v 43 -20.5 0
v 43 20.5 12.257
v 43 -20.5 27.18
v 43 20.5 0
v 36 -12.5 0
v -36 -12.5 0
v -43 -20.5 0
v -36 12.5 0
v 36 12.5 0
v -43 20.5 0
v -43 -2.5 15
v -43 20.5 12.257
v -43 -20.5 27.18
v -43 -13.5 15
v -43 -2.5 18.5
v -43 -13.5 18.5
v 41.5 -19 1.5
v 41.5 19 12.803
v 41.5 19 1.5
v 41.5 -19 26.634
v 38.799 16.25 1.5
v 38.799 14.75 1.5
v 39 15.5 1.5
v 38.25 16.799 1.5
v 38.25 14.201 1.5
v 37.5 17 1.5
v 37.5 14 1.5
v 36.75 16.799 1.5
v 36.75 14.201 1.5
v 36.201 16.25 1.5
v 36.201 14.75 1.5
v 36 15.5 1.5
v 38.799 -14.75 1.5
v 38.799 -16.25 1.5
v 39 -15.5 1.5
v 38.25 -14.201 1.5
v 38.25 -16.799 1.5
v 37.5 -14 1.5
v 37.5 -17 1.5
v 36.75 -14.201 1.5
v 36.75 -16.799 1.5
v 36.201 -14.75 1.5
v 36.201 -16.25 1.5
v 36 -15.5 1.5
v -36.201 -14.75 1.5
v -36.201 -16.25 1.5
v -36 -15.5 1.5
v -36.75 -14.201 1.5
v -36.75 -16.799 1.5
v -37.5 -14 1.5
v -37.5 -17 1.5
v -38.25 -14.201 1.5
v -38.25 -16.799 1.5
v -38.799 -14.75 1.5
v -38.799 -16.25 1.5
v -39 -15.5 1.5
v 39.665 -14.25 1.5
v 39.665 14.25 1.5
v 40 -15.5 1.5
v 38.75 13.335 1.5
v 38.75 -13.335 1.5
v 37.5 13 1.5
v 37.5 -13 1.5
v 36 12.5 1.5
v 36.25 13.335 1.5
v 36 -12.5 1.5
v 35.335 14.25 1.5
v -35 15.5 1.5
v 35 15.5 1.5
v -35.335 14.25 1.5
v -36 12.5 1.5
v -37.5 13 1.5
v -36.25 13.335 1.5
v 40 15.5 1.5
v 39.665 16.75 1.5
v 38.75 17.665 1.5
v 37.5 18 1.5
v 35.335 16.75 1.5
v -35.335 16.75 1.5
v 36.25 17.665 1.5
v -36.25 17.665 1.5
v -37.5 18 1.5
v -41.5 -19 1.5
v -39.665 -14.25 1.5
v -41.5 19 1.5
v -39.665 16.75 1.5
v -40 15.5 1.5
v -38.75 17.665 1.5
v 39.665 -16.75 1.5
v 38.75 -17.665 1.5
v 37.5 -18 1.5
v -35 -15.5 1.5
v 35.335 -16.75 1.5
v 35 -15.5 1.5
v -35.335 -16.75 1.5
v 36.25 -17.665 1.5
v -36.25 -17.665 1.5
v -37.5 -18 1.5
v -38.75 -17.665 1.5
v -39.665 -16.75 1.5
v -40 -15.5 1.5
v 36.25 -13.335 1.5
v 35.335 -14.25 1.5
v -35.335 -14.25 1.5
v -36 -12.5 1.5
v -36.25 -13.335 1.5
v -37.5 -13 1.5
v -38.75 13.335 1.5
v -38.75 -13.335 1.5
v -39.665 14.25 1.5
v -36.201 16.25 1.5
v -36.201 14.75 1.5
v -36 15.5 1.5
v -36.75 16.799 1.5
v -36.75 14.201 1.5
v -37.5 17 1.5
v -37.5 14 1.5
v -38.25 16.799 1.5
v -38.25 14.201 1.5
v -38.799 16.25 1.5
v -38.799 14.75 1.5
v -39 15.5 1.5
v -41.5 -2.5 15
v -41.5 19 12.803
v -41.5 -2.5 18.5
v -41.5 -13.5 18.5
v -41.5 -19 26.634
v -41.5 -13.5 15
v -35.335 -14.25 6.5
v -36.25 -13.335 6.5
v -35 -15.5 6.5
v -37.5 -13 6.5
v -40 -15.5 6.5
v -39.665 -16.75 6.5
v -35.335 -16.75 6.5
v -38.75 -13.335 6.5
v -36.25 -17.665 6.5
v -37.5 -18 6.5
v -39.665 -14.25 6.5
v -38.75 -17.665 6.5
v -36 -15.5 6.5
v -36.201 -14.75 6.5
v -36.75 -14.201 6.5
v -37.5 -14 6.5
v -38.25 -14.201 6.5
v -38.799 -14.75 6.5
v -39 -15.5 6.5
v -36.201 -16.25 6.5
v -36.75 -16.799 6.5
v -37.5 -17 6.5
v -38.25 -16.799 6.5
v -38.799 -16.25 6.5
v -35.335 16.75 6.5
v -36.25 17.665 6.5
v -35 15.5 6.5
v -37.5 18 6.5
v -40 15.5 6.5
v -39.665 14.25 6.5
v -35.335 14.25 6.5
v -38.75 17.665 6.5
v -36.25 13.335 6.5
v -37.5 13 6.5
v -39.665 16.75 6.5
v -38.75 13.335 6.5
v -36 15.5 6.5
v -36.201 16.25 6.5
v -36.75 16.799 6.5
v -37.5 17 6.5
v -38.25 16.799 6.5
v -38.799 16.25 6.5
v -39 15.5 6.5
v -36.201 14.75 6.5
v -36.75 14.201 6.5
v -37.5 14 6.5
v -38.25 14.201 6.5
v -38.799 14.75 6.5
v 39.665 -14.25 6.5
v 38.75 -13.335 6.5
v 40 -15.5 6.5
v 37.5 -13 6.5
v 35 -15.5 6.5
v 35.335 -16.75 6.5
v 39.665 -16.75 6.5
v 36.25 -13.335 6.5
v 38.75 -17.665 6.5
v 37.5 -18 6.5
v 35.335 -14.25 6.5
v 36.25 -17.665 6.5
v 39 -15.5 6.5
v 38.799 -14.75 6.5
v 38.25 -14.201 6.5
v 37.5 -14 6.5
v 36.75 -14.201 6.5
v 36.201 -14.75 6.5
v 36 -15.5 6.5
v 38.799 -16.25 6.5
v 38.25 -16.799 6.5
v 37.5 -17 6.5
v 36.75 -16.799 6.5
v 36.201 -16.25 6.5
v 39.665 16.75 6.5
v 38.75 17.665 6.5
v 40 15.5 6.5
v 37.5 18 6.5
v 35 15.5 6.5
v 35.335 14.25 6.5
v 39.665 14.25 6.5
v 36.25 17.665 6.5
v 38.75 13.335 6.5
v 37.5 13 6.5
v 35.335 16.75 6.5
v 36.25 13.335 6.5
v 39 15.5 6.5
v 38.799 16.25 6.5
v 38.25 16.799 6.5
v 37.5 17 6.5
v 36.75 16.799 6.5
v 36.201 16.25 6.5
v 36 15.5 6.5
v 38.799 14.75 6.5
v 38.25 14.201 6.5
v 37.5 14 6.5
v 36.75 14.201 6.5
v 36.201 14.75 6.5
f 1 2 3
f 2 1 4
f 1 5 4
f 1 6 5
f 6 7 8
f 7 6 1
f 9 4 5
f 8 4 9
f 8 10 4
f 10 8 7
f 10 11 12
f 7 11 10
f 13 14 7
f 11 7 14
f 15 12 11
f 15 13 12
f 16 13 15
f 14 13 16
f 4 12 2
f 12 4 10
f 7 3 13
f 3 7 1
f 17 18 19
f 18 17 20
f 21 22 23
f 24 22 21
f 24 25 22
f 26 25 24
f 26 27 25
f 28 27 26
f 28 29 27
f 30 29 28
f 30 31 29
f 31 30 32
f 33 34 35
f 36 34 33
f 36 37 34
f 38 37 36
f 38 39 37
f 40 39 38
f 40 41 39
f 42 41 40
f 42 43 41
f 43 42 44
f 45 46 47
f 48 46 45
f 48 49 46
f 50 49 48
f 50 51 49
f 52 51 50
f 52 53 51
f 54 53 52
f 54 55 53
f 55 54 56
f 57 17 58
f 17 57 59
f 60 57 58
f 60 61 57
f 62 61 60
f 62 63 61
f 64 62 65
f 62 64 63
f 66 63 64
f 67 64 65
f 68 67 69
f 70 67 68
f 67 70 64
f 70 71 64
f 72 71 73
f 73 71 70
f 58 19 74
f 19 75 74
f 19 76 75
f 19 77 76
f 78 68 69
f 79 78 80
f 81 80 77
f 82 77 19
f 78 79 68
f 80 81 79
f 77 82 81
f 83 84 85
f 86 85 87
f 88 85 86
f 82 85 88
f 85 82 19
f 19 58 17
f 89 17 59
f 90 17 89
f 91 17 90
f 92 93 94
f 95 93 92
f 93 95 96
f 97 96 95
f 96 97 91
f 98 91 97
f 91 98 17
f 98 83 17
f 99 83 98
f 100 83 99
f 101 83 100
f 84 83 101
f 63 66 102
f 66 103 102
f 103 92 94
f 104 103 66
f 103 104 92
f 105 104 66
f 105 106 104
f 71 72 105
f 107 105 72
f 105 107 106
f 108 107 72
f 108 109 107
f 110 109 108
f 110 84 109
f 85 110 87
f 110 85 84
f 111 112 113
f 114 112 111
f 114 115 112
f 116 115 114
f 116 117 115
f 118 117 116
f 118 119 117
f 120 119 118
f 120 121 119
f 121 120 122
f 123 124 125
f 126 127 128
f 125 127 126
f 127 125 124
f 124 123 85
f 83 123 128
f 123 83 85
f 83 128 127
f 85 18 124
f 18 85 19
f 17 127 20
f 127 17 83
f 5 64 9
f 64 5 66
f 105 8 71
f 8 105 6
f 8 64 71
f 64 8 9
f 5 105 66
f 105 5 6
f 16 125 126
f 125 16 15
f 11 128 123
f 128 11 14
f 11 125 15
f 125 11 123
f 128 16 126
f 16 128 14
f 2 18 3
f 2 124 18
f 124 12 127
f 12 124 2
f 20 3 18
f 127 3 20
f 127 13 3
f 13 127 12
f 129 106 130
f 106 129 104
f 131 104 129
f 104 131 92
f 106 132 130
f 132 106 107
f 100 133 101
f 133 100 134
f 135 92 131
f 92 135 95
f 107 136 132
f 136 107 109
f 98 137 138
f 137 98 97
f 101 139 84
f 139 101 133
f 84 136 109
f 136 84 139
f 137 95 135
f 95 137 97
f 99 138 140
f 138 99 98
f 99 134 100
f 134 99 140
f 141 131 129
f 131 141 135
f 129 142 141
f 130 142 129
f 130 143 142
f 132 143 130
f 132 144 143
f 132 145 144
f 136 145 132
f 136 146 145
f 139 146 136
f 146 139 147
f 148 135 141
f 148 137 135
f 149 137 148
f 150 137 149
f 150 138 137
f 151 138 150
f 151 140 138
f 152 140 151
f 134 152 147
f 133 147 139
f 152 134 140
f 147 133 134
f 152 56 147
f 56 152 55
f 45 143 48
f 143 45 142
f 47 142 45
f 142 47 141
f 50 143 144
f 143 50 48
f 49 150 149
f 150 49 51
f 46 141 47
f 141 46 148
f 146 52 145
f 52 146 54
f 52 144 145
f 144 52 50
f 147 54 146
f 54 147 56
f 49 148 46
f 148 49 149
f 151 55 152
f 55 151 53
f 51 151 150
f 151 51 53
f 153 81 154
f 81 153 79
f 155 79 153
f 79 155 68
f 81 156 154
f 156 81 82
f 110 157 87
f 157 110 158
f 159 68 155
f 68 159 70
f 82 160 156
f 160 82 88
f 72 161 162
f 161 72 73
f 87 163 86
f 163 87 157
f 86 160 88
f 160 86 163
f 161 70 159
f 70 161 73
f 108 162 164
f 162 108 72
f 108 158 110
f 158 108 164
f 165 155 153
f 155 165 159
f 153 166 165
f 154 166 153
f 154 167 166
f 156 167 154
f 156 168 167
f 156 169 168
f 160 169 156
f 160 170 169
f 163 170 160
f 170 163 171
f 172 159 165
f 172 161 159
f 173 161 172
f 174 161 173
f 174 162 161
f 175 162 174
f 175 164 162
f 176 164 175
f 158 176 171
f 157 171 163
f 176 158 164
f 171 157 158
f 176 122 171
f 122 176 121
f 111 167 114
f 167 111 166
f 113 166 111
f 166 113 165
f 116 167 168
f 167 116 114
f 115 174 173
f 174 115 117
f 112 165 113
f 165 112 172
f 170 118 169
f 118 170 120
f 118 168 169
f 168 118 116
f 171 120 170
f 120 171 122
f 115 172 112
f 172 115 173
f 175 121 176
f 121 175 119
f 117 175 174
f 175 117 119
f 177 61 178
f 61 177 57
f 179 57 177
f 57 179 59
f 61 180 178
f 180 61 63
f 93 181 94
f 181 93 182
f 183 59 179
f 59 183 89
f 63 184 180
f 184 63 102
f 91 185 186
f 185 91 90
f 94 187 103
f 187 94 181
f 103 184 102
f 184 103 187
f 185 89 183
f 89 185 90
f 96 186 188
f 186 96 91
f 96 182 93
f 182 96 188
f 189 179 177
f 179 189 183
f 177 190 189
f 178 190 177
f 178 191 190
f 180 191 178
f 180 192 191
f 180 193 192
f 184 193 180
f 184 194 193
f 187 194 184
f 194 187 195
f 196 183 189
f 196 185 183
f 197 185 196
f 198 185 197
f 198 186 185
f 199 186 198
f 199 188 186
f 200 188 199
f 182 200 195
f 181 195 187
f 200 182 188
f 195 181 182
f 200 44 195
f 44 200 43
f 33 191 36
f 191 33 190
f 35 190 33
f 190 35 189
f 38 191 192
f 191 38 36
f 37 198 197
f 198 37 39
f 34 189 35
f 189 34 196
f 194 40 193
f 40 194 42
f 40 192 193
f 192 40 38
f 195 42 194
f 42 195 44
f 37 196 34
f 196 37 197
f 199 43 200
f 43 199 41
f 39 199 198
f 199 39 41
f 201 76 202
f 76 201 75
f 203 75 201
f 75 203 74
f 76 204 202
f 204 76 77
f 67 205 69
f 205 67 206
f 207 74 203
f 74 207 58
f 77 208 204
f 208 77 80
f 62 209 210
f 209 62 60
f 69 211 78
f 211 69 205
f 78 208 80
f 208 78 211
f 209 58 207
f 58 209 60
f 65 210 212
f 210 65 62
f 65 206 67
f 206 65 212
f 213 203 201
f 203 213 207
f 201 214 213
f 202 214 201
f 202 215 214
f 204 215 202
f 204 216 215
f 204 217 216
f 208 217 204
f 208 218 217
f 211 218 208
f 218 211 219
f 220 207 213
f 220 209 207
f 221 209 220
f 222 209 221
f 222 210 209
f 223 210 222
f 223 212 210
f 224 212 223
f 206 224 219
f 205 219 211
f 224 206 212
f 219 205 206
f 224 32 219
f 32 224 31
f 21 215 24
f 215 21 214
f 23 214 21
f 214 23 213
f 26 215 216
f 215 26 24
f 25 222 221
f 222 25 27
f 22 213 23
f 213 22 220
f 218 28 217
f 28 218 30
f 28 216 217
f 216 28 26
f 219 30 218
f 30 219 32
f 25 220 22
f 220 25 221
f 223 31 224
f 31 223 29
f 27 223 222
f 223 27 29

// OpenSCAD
// -------------------------------------------
//               Digispark LCD case
//                 by Jan-Willem
//
//                   28.04.2013  
// -------------------------------------------
//   17.05.2013 official release on thingiverse


//shape = "flat"; 
shape = "angle";

// outer size
boxx = 86;
boxy = 41;   // internal size = 41-2*1.5 = 38.0
boxz = 21;

wall = 1.5;

// LCD pcb
//pcblcdx = 80;
//pcblcdy = 36;
//pcblcdz = 1.8;  //thichness off PCB

// distance between LCD PCB screws
lcdscrewx = 75; 
lcdscrewy = 31;

// window for LCD
lcdx    = 72;
lcdy    = 25;

// LCD mounting holes
standz  =   5;        // height of the standoff
standr  = 2.5;       // 5 mm diameter
screwz = standz;  // depth of srew hole
screwr = 1.5;       // 3 mm hole size

// 4 pole connector size
cony =   10 + 1;
conz =  2.5 + 1;

conlocz = 8.5+standz;  // 8.5 mm above pcb
conlocy = 2; // 2 mm from centre of hole

$fn=12;


// make the module
translate([-boxx/2,-boxy/2,0]) frontplate();

// view only
//translate([-boxx/2,-boxy/2,boxz+10])# bottom();

// print bottom
//if (shape == "flat")
//    	{rotate([0,180,0])  translate([-boxx/2,-boxy/2,-wall])  bottom();}
//	else
//	{translate([boxx/2,-boxy/2,wall])  rotate([20,180,0])  bottom();}



// make standoff for LCD pcb
// ------------------------------
module standoff()
	{difference()
		{translate([0,0,0]) cylinder(r=standr,h=standz+wall);
		  translate([0,0,wall+standz-screwz]) cylinder(r=screwr,h=screwz+0.1);
		}
	}




// LCD case
// --------------------------
module frontplate()
	{difference()
		{ if (shape=="flat") {cube([boxx,boxy,boxz]);}
                     else                 {cube([boxx,boxy,boxz+20]);}

		// empty the inside of the box
		  translate([wall,wall,wall]) cube([boxx-2*wall,boxy-2*wall,boxz+20]); 

		// make LCD window
	 	  translate([(boxx-lcdx)/2,(boxy-lcdy)/2,-wall]) cube([lcdx,lcdy,3*wall]);

		// make hole for connector
		  translate([-wall,conlocy+(boxy-lcdscrewy)/2,conlocz+wall]) cube([3*wall,cony,conz]);

		// make box with angle 20 degrees
		if (shape == "angle")                              // remove part of the top
			{translate([-5,-5,29]) rotate([-20,0,0]) cube([boxx+10,boxy+10,boxz+10]); }

		}


// standoffs for LCD PCB
	translate([                (boxx-lcdscrewx)/2,                (boxy-lcdscrewy)/2,0]) standoff(); 
	translate([                (boxx-lcdscrewx)/2,lcdscrewy+(boxy-lcdscrewy)/2,0]) standoff();
	translate([lcdscrewx+(boxx-lcdscrewx)/2,                (boxy-lcdscrewy)/2,0]) standoff();
	translate([lcdscrewx+(boxx-lcdscrewx)/2,lcdscrewy+(boxy-lcdscrewy)/2,0]) standoff();


	}


// LCD bottom
// ---------------------------
module bottom()
	{ if (shape=="flat")
		{difference()
			{union()
				{cube([boxx,boxy,wall]);
	   		 	translate([wall,wall,-2]) cube([boxx-2*wall,boxy-2*wall,2+wall]);
				}
			translate([2*wall,2*wall,-2.1]) cube([boxx-4*wall,boxy-4*wall,2.1]);

			// remove the corners
			translate([0,0,-2.1]) cube([25,15,2.1]);
			translate([boxx-25,0,-2.1]) cube([25,15,2.1]);	
			translate([0,boxy-15,-2.1]) cube([25,15,2.1]);	
			translate([boxx-25,boxy-15,-2.1]) cube([25,15,2.1]);	
			}
		}
	   else { rotate([-20,0,0]) cube([boxx,boxy+3,wall]); 
		     translate([boxx/2-15,wall,            -wall-1.5]) cube([30,2,3]);
		     translate([boxx/2-15,boxy-wall-2,-16])          cube([30,2,3]);

		     translate([wall,22,-10]) rotate([-20,0,0])  cube([2,15,3]);	// con side
		     translate([boxx-wall-2,10,-6]) rotate([-20,0,0])  cube([2,25,3]);	
		   } // end of else			
	}








 
